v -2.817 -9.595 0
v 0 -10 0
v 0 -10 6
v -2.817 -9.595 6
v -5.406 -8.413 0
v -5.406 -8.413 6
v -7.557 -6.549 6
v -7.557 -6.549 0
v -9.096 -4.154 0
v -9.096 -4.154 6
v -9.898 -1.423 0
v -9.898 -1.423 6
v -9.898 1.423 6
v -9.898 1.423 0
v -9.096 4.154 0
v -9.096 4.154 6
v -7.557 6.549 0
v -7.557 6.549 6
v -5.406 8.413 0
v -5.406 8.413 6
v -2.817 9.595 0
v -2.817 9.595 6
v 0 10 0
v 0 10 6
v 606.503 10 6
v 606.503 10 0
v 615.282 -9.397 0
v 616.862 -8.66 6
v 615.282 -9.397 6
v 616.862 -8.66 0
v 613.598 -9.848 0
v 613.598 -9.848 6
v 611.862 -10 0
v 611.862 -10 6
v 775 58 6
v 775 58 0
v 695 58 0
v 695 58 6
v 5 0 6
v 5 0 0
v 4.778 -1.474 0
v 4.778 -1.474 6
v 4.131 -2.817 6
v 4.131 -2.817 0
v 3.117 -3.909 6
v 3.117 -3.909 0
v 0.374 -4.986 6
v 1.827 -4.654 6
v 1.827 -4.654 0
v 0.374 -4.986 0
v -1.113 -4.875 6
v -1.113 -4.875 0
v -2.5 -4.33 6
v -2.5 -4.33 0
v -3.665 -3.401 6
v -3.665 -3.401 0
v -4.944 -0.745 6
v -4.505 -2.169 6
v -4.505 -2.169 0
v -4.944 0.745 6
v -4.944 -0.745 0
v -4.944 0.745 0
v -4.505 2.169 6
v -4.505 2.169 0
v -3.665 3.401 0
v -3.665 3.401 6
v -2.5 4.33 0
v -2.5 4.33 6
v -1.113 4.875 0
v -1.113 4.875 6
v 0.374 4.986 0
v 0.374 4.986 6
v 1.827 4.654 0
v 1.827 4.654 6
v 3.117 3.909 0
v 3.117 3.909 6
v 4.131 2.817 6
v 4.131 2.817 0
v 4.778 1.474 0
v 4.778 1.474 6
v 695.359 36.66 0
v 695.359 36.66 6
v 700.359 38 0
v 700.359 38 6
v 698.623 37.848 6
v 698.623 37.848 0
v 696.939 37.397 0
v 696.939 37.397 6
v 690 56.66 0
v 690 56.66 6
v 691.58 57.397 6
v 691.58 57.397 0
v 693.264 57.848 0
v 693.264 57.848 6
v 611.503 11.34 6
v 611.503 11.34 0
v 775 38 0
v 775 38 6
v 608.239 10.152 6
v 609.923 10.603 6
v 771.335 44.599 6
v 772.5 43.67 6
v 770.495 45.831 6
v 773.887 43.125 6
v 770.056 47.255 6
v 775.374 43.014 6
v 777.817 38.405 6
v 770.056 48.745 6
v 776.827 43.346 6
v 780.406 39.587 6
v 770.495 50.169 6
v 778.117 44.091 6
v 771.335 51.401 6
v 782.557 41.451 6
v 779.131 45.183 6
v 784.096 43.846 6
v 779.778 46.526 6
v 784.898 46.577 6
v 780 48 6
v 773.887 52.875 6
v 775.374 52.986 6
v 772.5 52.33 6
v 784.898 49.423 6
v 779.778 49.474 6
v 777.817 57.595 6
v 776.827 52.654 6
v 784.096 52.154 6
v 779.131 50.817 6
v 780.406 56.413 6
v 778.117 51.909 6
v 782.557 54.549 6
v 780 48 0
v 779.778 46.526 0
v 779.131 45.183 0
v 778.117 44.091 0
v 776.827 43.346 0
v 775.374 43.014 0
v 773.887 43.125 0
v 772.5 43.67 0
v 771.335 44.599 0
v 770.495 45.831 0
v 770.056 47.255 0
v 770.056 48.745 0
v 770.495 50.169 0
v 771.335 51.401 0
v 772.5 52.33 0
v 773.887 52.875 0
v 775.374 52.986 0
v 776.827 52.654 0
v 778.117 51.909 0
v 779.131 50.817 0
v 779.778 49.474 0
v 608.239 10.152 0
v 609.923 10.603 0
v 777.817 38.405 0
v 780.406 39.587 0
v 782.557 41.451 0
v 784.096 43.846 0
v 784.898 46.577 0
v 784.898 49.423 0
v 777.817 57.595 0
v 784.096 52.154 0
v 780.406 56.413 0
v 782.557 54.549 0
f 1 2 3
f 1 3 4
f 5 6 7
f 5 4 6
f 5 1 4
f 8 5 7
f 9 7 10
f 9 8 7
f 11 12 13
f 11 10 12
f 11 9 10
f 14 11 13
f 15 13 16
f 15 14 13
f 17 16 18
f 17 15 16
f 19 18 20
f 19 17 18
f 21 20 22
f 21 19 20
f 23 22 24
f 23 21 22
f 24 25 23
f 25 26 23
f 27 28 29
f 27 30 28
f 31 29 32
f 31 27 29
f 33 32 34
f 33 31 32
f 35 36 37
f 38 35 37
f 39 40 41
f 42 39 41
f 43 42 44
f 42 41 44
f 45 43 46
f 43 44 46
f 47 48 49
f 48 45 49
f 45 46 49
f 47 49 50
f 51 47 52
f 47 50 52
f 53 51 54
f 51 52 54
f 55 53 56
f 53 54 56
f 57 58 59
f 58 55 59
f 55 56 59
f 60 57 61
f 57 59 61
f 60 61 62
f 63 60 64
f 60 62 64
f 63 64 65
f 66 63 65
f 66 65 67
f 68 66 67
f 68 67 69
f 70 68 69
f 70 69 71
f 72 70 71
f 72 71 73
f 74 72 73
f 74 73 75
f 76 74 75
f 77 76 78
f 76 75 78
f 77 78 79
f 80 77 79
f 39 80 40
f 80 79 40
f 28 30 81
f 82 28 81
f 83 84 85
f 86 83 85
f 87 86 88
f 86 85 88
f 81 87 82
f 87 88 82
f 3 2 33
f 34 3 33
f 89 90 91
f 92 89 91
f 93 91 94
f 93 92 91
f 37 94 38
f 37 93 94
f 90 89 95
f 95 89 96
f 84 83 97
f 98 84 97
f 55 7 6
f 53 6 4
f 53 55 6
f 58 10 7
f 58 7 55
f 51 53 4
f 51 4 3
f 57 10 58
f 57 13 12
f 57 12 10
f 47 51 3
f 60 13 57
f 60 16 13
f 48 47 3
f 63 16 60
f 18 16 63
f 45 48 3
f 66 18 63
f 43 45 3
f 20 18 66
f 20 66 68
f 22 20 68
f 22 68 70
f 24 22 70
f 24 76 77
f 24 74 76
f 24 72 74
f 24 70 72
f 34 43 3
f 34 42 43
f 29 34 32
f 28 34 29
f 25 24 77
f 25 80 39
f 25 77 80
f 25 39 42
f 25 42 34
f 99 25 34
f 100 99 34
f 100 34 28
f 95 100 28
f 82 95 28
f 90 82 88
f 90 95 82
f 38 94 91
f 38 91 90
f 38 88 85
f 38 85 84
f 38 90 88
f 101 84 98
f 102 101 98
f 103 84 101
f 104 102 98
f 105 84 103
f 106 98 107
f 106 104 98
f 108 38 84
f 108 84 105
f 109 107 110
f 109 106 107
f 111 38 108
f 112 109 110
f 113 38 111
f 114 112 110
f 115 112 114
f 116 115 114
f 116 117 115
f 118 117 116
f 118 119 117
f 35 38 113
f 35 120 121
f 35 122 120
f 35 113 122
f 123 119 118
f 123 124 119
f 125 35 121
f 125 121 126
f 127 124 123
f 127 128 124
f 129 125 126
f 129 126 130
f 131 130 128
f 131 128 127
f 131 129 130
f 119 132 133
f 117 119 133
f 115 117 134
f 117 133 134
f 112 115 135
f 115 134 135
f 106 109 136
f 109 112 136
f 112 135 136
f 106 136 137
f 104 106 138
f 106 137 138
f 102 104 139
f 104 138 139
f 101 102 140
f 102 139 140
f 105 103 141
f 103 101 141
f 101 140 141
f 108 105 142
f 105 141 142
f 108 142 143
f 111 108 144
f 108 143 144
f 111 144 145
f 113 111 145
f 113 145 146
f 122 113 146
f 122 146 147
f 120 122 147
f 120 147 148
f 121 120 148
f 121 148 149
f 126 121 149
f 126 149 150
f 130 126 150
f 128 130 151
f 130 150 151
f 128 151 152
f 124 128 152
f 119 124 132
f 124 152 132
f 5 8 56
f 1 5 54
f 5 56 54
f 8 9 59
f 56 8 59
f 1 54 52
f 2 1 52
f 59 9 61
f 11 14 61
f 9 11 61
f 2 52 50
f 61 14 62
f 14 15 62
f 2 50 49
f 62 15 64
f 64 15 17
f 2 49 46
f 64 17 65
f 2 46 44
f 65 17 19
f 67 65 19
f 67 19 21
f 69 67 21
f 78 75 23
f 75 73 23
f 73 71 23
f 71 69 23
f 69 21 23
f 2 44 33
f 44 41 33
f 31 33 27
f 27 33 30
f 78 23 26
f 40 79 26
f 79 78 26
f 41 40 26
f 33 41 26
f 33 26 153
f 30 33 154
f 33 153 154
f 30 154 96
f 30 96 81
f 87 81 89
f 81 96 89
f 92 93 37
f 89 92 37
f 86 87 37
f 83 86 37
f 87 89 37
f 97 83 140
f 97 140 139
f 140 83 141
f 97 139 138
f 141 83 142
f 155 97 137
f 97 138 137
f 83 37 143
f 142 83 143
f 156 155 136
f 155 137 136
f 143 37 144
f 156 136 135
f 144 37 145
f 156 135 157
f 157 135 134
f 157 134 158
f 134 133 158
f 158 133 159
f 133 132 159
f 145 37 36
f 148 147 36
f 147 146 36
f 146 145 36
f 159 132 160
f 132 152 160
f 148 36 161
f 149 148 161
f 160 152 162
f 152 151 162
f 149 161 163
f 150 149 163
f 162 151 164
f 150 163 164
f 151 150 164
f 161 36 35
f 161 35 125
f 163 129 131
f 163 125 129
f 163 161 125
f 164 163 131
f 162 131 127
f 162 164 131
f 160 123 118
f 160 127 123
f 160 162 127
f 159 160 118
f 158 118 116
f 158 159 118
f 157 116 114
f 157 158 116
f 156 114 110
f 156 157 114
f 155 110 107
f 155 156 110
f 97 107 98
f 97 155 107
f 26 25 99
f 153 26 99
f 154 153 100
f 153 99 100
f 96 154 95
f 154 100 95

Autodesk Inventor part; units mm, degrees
ref_plane "YZ Plane" through (0, 0, 0) normal (1, 0, 0) x (0, 1, 0)
ref_plane "XZ Plane" through (0, 0, 0) normal (0, 1, 0) x (-1, 0, 0)
ref_plane "XY Plane" through (0, 0, 0) normal (0, 0, 1) x (1, 0, 0)
sketch "Sketch1" plane through (0, 0, 0) normal (0, 0, 1) x (1, 0, 0)
  circle A0 centre (775, 48) radius 5
  circle A1 centre (0, 0) radius 5
  line L0 (0, 0) -> (611.8616, 0) construction
  line L1 (0, -10) -> (611.8616, -10)
  line L2 (611.8616, 10) -> (0, 10)
  arc A2 (0, 10) -> (0, -10) centre (0, 0) ccw
  arc A3 (611.8616, -10) -> (611.8616, 10) centre (611.8616, 0) ccw
  line L3 (611.8616, 0) -> (695, 48) construction
  line L4 (616.8616, -8.6603) -> (700, 39.3397)
  line L5 (690, 56.6603) -> (606.8616, 8.6603)
  arc A4 (606.8616, 8.6603) -> (616.8616, -8.6603) centre (611.8616, 0) ccw
  arc A5 (700, 39.3397) -> (690, 56.6603) centre (695, 48) ccw
  line L6 (695, 48) -> (775, 48) construction
  line L7 (695, 38) -> (775, 38)
  line L8 (775, 58) -> (695, 58)
  arc A6 (695, 58) -> (695, 38) centre (695, 48) ccw
  arc A7 (775, 38) -> (775, 58) centre (775, 48) ccw
  point P0 (305.9308, 0)
  point P1 (653.4308, 24)
  point P2 (735, 48)
  point P3 (616.8616, -8.6603)
  point P4 (697.6795, 38)
  point P5 (609.1821, 10)
  dimension "d0" = 775
  dimension "d1" = 10
  dimension "d2" = 48
  dimension "d4" = 10
  dimension "d5" = 30
  dimension "d6" = 80
extrude "Extrusion1" add sketch "Sketch1" along normal blind 6
fillet "Fillet1" radius 10 2 edges at (697.6795, 38, 3) (609.1821, 10, 3)
properties part number "FRC001-1"
